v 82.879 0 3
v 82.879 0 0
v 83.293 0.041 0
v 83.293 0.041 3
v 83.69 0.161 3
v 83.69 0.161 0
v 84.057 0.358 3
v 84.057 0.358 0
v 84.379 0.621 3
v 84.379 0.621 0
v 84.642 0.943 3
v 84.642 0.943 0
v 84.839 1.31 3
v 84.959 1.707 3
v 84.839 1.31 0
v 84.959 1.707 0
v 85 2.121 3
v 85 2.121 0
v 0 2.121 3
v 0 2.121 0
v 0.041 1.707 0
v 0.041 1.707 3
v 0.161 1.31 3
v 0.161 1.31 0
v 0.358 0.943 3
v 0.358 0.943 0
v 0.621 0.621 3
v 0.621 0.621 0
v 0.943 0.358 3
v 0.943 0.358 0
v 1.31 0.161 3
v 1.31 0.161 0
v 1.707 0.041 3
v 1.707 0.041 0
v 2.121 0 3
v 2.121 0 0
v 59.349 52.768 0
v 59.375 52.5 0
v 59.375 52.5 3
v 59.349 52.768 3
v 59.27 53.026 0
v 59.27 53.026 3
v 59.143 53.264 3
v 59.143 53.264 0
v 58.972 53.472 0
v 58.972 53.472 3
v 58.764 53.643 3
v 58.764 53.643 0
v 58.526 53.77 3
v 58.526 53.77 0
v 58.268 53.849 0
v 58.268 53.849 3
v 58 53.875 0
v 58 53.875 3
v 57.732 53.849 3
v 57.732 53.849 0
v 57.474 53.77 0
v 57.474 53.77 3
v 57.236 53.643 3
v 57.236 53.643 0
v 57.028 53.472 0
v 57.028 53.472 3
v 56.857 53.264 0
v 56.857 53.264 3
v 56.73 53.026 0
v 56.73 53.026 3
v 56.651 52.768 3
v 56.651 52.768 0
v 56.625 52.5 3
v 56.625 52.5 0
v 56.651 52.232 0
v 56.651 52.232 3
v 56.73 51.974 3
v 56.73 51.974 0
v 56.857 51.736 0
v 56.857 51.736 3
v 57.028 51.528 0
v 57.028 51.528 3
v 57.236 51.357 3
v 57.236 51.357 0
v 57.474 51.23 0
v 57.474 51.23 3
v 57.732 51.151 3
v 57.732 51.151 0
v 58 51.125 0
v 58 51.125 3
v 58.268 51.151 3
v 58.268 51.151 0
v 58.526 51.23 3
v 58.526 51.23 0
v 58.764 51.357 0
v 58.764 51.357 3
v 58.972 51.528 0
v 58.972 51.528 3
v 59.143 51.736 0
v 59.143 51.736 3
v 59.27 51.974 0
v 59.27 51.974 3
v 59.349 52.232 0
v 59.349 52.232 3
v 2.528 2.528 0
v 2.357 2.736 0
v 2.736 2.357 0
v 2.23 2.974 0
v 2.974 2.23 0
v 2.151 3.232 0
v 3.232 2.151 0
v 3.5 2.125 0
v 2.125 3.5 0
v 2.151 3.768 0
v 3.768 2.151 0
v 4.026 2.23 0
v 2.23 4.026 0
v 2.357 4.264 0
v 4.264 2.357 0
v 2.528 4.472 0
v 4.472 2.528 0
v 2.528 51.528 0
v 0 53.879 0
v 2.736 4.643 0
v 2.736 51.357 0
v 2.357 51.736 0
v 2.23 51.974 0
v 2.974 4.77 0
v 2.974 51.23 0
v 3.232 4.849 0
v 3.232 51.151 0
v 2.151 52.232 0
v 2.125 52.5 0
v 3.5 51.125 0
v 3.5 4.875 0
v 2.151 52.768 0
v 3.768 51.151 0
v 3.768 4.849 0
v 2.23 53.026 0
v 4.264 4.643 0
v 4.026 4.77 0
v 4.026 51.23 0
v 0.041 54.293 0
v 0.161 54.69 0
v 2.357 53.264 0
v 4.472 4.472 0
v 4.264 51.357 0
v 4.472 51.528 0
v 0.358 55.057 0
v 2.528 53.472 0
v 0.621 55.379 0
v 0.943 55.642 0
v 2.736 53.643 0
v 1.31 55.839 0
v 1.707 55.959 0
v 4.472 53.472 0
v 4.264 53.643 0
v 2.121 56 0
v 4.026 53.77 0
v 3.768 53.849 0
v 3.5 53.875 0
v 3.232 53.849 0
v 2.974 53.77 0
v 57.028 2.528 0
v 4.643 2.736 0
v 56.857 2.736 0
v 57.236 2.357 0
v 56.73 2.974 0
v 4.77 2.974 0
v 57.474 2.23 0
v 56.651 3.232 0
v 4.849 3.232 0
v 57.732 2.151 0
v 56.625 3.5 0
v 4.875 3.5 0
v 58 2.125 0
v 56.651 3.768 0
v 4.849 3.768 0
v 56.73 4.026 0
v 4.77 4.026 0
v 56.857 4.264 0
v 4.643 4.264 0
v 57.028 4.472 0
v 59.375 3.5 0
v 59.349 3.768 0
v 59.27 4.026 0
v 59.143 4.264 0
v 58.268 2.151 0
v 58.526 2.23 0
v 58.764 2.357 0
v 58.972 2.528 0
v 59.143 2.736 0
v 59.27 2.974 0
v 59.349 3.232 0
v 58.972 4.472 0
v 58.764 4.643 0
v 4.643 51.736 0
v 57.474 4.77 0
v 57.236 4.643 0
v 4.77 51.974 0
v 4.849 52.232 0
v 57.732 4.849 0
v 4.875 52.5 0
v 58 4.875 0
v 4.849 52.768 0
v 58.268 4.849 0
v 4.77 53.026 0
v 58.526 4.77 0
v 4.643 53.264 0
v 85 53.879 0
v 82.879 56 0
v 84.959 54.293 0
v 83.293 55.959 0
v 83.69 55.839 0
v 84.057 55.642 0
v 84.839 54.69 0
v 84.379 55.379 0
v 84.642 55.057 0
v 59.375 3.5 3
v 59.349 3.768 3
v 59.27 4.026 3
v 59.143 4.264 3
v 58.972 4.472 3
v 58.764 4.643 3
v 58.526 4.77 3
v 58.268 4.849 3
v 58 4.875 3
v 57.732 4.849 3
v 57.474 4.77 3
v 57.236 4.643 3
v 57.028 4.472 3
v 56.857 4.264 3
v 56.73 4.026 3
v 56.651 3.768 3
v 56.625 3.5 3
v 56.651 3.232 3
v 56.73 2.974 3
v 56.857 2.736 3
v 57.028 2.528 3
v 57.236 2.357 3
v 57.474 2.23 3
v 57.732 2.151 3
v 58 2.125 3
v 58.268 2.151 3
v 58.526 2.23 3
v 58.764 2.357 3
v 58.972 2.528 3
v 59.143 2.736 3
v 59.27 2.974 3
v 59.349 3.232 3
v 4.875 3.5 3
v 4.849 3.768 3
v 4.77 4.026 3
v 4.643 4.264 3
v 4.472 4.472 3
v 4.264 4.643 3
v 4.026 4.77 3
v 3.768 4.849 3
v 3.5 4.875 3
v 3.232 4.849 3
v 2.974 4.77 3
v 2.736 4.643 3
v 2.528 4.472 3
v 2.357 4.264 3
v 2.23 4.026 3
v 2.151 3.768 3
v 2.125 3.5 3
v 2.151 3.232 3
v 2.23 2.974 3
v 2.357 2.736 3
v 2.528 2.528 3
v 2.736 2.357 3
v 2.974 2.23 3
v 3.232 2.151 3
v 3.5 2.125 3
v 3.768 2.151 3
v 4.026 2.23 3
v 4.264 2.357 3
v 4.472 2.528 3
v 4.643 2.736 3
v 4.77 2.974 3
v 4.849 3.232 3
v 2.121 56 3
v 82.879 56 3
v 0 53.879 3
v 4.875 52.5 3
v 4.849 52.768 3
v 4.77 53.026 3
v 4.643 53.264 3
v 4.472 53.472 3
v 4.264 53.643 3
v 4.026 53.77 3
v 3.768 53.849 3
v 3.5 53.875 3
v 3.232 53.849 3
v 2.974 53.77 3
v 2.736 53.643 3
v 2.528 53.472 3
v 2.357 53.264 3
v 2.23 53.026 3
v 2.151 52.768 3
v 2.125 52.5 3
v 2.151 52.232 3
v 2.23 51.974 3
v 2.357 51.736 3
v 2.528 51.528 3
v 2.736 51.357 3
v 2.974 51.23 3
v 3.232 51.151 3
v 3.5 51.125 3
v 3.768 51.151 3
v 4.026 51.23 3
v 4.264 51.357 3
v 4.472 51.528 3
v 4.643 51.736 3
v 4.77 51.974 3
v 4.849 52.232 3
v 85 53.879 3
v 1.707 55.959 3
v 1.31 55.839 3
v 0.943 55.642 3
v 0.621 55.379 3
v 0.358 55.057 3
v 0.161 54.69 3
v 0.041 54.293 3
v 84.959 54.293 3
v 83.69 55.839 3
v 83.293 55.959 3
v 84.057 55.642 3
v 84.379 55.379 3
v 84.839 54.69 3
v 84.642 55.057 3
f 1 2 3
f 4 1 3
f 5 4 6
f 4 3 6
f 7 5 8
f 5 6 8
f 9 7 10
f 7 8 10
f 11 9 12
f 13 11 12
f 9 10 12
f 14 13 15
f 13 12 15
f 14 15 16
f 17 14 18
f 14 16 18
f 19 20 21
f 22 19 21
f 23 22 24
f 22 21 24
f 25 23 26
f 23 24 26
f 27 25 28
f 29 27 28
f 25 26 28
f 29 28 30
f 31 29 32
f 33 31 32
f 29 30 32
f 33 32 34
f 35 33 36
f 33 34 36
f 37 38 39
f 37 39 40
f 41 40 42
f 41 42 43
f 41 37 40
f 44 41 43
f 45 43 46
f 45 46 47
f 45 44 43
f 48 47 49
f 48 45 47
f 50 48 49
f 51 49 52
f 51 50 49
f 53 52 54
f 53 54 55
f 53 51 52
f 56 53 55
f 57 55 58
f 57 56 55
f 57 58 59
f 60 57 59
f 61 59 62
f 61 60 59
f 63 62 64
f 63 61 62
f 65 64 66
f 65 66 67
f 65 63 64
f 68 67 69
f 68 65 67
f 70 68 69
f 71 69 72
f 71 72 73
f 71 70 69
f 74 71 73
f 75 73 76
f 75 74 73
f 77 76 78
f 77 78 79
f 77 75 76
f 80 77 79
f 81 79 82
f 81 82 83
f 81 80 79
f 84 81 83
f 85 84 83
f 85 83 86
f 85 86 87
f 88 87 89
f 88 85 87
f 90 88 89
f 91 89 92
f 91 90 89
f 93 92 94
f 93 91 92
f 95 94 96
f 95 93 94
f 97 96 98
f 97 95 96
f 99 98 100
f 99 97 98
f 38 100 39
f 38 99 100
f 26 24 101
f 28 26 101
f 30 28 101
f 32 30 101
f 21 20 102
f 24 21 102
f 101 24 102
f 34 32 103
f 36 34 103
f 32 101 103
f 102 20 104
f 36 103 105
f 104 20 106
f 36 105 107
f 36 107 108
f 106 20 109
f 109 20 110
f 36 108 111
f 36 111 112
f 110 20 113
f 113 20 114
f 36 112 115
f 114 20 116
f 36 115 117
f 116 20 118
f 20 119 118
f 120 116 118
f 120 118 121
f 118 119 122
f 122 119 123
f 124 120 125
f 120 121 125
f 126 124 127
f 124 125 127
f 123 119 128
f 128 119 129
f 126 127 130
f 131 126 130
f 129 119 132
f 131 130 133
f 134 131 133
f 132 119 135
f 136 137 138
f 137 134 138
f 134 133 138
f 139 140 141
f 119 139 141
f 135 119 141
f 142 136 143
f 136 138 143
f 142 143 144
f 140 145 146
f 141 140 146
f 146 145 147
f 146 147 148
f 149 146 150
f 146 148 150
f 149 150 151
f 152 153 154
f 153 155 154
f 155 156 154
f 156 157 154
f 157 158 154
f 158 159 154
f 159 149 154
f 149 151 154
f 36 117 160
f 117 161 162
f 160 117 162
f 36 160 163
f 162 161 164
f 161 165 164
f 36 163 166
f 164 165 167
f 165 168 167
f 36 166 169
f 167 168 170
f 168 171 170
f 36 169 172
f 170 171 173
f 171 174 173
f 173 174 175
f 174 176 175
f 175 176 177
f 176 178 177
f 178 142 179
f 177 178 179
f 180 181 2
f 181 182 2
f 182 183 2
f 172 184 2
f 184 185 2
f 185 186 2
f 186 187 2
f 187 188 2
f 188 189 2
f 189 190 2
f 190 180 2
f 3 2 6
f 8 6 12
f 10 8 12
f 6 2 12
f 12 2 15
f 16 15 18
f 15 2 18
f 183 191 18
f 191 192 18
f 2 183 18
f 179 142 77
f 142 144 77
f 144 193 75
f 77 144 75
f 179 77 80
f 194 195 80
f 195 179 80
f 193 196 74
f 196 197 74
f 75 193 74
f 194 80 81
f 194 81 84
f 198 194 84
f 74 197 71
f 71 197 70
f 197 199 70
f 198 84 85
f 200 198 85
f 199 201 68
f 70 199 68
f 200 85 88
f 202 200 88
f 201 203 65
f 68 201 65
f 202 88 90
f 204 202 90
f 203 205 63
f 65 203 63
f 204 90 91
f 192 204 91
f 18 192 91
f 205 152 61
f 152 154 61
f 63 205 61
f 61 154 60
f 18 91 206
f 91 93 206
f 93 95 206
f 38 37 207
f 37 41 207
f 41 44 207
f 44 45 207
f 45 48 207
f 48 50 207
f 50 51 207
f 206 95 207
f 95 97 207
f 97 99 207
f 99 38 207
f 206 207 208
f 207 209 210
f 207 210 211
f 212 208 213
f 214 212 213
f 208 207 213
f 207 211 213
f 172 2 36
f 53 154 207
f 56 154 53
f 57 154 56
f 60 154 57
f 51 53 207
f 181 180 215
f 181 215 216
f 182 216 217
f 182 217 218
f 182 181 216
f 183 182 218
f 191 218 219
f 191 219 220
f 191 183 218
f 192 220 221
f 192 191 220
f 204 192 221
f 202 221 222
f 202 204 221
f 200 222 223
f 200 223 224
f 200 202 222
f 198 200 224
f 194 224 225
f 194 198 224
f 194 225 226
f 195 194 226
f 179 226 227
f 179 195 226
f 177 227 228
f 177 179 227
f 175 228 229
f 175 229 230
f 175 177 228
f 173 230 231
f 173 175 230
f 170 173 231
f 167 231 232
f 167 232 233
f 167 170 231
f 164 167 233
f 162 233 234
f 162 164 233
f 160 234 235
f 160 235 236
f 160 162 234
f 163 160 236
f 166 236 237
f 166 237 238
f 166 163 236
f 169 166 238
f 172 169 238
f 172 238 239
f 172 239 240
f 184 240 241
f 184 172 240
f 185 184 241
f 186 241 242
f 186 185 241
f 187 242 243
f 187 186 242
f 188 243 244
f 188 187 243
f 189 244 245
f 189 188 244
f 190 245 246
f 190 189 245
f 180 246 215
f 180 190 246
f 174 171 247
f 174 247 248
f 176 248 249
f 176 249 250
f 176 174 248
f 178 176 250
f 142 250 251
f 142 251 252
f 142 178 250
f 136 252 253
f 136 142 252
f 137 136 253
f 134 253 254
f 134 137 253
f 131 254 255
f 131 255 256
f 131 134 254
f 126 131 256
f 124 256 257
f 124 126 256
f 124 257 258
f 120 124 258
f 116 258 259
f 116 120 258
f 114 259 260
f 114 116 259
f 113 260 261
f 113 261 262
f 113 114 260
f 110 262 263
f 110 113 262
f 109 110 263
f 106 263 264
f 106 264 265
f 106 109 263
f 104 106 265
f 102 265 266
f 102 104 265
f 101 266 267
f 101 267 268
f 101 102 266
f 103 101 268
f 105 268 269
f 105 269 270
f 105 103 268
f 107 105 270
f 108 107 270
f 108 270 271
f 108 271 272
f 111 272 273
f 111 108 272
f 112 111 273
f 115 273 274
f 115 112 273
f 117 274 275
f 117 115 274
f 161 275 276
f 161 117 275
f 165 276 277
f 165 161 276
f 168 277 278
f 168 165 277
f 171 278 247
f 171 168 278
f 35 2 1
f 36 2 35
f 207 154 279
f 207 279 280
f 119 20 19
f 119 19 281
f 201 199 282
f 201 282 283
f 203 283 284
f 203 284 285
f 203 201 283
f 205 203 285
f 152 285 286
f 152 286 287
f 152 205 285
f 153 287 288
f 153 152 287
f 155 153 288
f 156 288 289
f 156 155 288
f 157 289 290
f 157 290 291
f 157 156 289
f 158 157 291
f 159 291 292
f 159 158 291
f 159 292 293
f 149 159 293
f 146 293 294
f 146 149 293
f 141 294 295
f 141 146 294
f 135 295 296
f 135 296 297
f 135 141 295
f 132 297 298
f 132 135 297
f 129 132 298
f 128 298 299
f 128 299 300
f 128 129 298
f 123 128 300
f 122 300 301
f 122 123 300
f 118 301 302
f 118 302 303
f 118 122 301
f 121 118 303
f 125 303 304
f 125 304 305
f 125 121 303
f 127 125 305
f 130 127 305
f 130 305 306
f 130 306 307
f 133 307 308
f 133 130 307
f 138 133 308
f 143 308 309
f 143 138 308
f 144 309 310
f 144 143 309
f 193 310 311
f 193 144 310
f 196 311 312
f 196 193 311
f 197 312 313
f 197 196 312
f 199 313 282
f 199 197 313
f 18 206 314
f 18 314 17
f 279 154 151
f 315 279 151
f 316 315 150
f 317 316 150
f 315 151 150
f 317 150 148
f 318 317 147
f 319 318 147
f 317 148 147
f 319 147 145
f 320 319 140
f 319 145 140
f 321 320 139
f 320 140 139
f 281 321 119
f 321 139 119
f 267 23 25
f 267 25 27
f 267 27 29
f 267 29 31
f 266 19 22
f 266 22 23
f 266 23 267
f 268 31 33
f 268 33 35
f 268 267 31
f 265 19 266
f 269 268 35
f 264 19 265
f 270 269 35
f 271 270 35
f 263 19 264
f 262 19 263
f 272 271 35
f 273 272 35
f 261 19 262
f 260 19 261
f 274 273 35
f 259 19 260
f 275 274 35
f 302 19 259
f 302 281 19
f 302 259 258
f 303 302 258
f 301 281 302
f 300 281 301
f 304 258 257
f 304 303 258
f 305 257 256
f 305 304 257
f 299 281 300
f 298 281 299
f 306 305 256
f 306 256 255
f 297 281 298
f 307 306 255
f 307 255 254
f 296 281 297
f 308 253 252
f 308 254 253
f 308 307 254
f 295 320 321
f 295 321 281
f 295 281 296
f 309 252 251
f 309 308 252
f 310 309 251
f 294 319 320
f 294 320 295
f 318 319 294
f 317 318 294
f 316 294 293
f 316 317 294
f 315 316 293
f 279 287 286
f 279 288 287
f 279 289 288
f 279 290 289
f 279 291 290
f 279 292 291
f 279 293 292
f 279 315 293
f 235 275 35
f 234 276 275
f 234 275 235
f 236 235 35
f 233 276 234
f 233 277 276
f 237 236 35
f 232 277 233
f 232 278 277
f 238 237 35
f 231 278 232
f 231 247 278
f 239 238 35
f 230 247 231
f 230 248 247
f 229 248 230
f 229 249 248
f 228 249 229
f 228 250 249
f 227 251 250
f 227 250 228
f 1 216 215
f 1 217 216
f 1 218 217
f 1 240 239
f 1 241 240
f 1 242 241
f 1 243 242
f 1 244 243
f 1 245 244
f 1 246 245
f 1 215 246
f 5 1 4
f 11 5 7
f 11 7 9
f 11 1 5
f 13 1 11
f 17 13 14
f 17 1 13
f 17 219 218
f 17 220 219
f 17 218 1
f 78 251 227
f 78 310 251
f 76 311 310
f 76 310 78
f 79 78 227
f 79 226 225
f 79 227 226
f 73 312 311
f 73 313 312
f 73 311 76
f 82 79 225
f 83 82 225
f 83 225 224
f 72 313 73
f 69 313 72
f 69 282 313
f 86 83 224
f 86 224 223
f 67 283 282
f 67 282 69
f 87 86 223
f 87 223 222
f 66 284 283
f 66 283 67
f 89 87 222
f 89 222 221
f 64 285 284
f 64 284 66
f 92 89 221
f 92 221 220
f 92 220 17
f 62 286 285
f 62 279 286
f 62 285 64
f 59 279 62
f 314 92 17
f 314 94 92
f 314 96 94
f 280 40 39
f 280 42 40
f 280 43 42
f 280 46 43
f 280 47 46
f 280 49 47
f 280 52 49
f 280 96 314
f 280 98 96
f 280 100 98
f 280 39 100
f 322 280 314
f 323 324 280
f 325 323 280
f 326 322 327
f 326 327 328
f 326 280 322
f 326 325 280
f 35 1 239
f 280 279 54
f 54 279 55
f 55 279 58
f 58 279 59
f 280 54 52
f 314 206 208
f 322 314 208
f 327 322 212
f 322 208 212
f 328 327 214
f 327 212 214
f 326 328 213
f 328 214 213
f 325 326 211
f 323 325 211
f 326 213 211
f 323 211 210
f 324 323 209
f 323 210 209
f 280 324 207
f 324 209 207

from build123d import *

# Parameters (mm, degrees)
SKETCH_R  = 1.375
PAD_DEPTH = 3


with BuildPart() as part:
    # Sketch → Pad (new body)
    with BuildSketch(Plane.XY):
        with BuildLine():
            ThreePointArc((0, 2.12132), (0.62132, 0.62132), (2.12132, 0))
            Line((82.87868, 0), (2.12132, 0))
            ThreePointArc((82.87868, 0), (84.37868, 0.62132), (85, 2.12132))
            Line((85, 53.87868), (85, 2.12132))
            ThreePointArc((85, 53.87868), (84.37868, 55.37868), (82.87868, 56))
            Line((2.12132, 56), (82.87868, 56))
            ThreePointArc((2.12132, 56), (0.62132, 55.37868), (0, 53.87868))
            Line((0, 2.12132), (0, 53.87868))
        make_face()
        with Locations((3.5, 3.5)):
            Circle(SKETCH_R, mode=Mode.SUBTRACT)
        with Locations((3.5, 52.5)):
            Circle(SKETCH_R, mode=Mode.SUBTRACT)
        with Locations((58, 52.5)):
            Circle(SKETCH_R, mode=Mode.SUBTRACT)
        with Locations((58, 3.5)):
            Circle(SKETCH_R, mode=Mode.SUBTRACT)
    extrude(amount=PAD_DEPTH)


solid = part.part
